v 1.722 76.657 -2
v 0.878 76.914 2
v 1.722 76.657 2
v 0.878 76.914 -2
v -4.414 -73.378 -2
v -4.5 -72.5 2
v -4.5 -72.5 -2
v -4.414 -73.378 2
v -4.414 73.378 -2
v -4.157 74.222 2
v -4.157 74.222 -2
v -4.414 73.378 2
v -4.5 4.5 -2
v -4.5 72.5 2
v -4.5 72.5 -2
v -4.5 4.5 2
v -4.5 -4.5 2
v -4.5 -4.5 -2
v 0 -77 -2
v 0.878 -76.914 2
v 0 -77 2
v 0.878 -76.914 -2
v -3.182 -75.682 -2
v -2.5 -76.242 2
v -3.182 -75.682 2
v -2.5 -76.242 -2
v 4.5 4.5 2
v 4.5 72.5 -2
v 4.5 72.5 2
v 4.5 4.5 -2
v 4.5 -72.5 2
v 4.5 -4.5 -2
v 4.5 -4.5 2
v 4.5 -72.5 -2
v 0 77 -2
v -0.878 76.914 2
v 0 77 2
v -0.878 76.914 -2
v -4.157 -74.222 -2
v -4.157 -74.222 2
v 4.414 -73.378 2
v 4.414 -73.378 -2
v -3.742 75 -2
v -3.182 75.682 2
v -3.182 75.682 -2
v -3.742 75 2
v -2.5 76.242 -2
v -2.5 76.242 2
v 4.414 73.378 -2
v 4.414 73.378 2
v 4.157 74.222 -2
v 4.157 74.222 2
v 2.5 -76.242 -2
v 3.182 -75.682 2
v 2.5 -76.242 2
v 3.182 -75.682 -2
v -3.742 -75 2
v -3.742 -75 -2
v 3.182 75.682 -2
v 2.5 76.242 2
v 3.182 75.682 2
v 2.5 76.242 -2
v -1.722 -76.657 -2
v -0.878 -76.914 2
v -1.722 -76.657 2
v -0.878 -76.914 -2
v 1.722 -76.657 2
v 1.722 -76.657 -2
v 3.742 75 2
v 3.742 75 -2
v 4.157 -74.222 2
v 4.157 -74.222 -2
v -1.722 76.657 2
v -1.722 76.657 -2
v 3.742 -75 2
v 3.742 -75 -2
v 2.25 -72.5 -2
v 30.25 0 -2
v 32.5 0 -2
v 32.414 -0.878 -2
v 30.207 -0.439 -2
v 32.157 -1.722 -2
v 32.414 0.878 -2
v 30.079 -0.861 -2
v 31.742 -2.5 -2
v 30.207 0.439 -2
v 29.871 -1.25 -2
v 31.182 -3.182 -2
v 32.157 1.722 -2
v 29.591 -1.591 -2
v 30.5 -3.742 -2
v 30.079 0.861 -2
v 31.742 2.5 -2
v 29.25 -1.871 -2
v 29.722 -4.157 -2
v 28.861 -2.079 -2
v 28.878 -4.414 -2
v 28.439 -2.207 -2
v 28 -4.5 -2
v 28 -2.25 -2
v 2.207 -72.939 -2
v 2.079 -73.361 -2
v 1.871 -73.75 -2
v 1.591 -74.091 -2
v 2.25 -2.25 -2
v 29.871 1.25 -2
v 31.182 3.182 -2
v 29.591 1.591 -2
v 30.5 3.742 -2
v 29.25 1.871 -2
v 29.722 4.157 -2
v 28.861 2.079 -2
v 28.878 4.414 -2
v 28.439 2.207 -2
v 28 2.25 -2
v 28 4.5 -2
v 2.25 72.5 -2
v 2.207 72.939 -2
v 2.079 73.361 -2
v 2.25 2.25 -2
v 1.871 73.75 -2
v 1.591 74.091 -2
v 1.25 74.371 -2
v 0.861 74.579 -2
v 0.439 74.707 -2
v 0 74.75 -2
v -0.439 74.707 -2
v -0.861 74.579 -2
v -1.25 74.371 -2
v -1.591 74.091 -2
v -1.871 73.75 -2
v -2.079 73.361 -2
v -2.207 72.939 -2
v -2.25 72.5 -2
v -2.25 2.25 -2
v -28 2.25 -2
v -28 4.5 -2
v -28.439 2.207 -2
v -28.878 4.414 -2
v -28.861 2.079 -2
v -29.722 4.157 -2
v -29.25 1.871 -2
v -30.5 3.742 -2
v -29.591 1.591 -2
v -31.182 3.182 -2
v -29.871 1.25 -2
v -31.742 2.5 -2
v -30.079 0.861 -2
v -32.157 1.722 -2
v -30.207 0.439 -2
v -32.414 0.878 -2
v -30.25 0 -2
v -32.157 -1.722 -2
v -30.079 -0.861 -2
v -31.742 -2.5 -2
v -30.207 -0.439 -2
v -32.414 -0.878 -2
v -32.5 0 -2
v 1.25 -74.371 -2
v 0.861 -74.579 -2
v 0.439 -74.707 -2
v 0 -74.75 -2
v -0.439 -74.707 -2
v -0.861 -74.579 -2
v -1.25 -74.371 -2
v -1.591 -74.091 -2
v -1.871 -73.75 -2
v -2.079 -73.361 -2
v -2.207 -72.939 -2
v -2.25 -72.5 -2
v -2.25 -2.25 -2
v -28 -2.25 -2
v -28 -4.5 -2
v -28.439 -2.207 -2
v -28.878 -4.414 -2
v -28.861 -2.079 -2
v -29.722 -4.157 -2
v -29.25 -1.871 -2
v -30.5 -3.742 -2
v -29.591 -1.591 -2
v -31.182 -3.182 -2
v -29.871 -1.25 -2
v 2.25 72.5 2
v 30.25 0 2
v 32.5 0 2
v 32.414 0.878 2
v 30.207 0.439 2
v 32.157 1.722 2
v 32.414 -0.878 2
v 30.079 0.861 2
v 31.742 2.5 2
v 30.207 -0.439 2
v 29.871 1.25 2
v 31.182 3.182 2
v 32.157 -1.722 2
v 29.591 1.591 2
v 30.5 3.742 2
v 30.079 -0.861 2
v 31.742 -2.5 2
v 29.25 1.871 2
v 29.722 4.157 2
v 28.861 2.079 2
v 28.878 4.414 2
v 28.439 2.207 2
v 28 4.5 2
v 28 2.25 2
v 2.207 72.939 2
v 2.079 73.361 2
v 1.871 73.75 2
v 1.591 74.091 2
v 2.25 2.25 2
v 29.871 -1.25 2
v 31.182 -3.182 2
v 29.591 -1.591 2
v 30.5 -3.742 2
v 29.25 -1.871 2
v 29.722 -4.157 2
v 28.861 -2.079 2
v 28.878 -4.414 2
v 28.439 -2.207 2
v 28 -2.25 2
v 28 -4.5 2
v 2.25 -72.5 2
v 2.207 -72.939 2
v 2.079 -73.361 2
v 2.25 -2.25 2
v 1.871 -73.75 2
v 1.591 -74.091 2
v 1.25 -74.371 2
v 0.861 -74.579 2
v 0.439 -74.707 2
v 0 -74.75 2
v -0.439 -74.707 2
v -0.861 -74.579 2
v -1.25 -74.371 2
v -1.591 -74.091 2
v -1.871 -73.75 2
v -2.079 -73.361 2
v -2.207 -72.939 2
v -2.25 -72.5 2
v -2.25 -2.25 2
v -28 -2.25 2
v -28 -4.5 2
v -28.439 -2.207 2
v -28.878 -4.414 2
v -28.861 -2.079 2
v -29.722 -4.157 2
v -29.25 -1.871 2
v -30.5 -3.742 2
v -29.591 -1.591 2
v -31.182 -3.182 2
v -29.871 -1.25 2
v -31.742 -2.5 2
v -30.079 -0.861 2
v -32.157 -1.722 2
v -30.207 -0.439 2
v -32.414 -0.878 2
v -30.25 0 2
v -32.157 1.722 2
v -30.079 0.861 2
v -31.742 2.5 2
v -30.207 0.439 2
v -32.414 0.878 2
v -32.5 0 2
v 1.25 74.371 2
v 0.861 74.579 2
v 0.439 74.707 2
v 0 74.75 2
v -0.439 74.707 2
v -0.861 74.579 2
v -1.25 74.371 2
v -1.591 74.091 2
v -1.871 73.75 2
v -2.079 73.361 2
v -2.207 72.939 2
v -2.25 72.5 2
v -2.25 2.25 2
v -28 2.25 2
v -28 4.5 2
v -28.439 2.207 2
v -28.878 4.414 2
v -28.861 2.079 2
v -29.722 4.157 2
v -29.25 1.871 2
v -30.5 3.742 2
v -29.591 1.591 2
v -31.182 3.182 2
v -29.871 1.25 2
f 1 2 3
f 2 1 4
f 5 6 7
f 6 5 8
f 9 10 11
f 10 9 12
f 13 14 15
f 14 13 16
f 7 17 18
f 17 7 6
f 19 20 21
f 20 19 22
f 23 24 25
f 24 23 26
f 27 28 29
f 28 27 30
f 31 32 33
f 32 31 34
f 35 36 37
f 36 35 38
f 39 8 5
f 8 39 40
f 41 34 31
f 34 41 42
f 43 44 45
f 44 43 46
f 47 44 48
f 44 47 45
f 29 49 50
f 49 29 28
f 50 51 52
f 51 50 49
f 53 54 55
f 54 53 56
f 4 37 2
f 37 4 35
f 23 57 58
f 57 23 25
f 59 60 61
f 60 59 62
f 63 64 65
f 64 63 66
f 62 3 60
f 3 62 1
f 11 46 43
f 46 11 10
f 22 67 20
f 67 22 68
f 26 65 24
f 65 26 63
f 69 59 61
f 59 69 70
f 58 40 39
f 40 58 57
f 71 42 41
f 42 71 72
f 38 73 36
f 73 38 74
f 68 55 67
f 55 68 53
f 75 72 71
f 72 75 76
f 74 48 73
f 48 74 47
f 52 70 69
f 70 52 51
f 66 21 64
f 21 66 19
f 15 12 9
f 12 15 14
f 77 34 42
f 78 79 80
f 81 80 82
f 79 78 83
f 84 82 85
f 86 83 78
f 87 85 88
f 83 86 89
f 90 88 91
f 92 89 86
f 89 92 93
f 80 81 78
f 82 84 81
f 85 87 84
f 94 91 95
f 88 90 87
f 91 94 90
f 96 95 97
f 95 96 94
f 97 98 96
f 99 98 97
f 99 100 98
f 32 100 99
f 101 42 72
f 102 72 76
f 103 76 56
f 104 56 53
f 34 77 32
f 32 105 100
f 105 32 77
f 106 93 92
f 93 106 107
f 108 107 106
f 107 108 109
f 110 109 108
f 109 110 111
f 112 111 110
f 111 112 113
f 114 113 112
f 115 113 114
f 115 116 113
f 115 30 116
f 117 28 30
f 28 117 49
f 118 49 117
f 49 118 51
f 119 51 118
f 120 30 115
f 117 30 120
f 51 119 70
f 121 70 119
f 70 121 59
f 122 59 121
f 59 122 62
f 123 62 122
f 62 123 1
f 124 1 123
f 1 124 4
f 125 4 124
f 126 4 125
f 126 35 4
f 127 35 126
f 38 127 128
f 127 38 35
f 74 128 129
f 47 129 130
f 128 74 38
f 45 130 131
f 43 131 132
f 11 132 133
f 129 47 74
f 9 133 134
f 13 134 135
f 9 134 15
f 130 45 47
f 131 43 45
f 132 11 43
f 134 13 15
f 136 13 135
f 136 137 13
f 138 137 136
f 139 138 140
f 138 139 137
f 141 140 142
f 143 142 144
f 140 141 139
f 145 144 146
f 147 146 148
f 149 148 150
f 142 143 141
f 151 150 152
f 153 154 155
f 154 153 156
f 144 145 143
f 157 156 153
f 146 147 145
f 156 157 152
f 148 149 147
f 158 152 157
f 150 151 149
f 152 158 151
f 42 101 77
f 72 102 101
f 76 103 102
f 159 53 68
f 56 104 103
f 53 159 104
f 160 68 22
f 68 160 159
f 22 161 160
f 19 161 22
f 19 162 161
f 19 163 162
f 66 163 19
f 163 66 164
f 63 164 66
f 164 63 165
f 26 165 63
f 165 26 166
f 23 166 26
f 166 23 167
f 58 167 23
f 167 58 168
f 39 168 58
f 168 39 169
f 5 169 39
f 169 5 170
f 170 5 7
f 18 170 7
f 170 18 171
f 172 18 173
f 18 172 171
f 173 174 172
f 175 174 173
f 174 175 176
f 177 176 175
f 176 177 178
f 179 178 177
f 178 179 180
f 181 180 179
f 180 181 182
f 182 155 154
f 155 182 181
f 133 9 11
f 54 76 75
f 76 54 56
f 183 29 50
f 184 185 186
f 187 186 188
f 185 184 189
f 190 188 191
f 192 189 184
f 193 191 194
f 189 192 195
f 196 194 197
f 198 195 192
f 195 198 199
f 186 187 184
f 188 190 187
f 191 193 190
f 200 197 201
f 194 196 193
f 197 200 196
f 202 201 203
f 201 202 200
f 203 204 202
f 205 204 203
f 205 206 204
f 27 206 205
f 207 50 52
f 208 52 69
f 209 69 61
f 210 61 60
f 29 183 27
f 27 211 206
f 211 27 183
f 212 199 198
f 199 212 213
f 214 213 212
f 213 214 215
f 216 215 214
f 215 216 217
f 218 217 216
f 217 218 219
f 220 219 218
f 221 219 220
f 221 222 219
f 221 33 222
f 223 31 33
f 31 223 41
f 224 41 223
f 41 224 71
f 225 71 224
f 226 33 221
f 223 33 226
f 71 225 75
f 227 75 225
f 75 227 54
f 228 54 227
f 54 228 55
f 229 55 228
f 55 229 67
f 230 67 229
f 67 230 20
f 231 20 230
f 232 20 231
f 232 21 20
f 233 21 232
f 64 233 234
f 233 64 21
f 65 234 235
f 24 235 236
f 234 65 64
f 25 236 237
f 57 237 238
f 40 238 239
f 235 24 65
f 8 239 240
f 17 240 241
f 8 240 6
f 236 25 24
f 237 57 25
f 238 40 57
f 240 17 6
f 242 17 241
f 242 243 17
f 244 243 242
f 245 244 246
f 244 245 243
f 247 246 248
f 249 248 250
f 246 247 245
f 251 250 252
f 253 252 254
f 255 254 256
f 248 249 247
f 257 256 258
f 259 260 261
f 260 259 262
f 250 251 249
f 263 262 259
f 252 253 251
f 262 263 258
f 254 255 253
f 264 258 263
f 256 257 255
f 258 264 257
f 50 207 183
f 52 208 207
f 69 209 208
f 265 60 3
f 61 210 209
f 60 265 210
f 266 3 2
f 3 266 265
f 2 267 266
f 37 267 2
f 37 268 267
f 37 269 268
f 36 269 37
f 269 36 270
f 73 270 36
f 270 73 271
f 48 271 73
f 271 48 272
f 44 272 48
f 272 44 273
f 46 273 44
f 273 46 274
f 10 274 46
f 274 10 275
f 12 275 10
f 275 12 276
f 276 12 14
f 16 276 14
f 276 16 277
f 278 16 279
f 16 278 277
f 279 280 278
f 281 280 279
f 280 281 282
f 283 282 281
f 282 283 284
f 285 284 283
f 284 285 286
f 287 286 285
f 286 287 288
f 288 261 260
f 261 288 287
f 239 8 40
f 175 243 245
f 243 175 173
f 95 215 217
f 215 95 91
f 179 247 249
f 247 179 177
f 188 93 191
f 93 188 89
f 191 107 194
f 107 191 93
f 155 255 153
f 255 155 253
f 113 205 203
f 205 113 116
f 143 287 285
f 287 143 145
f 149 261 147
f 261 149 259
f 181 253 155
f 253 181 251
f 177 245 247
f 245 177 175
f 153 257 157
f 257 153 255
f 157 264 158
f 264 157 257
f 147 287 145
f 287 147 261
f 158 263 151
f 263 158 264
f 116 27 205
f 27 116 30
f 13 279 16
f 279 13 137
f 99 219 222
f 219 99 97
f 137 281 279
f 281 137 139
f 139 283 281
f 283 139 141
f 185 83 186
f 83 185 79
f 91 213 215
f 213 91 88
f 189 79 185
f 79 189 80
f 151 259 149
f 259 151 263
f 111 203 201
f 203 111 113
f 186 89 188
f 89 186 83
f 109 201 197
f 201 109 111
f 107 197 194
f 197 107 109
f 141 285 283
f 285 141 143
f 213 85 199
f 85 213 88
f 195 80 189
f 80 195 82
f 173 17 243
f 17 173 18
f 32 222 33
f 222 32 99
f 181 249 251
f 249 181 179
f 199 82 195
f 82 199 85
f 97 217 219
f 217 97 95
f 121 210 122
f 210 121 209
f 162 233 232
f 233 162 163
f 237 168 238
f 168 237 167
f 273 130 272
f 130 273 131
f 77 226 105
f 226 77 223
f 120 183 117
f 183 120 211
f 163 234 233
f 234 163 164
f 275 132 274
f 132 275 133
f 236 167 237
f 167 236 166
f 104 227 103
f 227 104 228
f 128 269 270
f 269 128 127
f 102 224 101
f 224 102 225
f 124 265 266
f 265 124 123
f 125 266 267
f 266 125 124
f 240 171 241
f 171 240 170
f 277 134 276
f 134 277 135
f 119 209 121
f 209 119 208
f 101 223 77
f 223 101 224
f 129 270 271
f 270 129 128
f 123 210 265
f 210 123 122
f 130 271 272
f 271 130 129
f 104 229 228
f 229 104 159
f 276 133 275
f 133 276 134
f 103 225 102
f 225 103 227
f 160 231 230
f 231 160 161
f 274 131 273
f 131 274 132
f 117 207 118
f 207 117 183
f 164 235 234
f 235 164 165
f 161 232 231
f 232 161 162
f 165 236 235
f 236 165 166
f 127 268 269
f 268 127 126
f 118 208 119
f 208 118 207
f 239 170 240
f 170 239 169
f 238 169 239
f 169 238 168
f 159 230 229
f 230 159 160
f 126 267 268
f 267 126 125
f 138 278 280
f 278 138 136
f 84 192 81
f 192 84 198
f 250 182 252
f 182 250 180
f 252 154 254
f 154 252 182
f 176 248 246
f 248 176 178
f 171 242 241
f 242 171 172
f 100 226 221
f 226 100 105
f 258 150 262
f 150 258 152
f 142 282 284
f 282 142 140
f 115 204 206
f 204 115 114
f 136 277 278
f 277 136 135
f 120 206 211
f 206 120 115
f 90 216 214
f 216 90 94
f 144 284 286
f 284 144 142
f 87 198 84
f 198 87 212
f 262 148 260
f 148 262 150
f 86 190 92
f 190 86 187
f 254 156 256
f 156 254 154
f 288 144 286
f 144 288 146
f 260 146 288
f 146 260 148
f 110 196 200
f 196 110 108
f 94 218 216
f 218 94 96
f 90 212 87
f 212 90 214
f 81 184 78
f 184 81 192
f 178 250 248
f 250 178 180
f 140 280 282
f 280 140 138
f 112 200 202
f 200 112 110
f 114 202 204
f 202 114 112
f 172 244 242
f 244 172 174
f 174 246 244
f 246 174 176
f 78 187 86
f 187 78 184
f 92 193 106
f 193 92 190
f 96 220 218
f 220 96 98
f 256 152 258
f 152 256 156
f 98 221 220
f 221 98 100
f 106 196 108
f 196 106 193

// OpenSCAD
len_phone = 145;
width_phone = 56;
d_screw_m4 = 4.5;
thickness_holder = 4;

holder_set();

module holder_set() {
    difference(){
        t_cross();
        screw_hole();
    }
}

module t_cross() {
    hull() {
        translate([0, -len_phone/2, 0])
        cylinder(d=9, h=thickness_holder, center=true, $fn=32);

        translate([0, len_phone/2, 0])
        cylinder(d=9, h=thickness_holder, center=true, $fn=32);
    }
    
    hull() {
        translate([width_phone/2, 0, 0])
        cylinder(d=9, h=thickness_holder, center=true, $fn=32);

        translate([-width_phone/2, 0, 0])
        cylinder(d=9, h=thickness_holder, center=true, $fn=32);
    }
    
}

module screw_hole() {
    color("red")
    hull () {
        translate([0, -len_phone/2, 0])
        cylinder(d=d_screw_m4, thickness_holder+2, center=true, $fn=32);
            
        translate([0, len_phone/2, 0])
        cylinder(d=d_screw_m4, thickness_holder+2, center=true, $fn=32);
    }
    
    color("red")
    hull () {
        translate([width_phone/2, 0, 0])
        cylinder(d=d_screw_m4, thickness_holder+2, center=true, $fn=32);
            
        translate([-width_phone/2, 0, 0])
        cylinder(d=d_screw_m4, thickness_holder+2, center=true, $fn=32);
    }
}
